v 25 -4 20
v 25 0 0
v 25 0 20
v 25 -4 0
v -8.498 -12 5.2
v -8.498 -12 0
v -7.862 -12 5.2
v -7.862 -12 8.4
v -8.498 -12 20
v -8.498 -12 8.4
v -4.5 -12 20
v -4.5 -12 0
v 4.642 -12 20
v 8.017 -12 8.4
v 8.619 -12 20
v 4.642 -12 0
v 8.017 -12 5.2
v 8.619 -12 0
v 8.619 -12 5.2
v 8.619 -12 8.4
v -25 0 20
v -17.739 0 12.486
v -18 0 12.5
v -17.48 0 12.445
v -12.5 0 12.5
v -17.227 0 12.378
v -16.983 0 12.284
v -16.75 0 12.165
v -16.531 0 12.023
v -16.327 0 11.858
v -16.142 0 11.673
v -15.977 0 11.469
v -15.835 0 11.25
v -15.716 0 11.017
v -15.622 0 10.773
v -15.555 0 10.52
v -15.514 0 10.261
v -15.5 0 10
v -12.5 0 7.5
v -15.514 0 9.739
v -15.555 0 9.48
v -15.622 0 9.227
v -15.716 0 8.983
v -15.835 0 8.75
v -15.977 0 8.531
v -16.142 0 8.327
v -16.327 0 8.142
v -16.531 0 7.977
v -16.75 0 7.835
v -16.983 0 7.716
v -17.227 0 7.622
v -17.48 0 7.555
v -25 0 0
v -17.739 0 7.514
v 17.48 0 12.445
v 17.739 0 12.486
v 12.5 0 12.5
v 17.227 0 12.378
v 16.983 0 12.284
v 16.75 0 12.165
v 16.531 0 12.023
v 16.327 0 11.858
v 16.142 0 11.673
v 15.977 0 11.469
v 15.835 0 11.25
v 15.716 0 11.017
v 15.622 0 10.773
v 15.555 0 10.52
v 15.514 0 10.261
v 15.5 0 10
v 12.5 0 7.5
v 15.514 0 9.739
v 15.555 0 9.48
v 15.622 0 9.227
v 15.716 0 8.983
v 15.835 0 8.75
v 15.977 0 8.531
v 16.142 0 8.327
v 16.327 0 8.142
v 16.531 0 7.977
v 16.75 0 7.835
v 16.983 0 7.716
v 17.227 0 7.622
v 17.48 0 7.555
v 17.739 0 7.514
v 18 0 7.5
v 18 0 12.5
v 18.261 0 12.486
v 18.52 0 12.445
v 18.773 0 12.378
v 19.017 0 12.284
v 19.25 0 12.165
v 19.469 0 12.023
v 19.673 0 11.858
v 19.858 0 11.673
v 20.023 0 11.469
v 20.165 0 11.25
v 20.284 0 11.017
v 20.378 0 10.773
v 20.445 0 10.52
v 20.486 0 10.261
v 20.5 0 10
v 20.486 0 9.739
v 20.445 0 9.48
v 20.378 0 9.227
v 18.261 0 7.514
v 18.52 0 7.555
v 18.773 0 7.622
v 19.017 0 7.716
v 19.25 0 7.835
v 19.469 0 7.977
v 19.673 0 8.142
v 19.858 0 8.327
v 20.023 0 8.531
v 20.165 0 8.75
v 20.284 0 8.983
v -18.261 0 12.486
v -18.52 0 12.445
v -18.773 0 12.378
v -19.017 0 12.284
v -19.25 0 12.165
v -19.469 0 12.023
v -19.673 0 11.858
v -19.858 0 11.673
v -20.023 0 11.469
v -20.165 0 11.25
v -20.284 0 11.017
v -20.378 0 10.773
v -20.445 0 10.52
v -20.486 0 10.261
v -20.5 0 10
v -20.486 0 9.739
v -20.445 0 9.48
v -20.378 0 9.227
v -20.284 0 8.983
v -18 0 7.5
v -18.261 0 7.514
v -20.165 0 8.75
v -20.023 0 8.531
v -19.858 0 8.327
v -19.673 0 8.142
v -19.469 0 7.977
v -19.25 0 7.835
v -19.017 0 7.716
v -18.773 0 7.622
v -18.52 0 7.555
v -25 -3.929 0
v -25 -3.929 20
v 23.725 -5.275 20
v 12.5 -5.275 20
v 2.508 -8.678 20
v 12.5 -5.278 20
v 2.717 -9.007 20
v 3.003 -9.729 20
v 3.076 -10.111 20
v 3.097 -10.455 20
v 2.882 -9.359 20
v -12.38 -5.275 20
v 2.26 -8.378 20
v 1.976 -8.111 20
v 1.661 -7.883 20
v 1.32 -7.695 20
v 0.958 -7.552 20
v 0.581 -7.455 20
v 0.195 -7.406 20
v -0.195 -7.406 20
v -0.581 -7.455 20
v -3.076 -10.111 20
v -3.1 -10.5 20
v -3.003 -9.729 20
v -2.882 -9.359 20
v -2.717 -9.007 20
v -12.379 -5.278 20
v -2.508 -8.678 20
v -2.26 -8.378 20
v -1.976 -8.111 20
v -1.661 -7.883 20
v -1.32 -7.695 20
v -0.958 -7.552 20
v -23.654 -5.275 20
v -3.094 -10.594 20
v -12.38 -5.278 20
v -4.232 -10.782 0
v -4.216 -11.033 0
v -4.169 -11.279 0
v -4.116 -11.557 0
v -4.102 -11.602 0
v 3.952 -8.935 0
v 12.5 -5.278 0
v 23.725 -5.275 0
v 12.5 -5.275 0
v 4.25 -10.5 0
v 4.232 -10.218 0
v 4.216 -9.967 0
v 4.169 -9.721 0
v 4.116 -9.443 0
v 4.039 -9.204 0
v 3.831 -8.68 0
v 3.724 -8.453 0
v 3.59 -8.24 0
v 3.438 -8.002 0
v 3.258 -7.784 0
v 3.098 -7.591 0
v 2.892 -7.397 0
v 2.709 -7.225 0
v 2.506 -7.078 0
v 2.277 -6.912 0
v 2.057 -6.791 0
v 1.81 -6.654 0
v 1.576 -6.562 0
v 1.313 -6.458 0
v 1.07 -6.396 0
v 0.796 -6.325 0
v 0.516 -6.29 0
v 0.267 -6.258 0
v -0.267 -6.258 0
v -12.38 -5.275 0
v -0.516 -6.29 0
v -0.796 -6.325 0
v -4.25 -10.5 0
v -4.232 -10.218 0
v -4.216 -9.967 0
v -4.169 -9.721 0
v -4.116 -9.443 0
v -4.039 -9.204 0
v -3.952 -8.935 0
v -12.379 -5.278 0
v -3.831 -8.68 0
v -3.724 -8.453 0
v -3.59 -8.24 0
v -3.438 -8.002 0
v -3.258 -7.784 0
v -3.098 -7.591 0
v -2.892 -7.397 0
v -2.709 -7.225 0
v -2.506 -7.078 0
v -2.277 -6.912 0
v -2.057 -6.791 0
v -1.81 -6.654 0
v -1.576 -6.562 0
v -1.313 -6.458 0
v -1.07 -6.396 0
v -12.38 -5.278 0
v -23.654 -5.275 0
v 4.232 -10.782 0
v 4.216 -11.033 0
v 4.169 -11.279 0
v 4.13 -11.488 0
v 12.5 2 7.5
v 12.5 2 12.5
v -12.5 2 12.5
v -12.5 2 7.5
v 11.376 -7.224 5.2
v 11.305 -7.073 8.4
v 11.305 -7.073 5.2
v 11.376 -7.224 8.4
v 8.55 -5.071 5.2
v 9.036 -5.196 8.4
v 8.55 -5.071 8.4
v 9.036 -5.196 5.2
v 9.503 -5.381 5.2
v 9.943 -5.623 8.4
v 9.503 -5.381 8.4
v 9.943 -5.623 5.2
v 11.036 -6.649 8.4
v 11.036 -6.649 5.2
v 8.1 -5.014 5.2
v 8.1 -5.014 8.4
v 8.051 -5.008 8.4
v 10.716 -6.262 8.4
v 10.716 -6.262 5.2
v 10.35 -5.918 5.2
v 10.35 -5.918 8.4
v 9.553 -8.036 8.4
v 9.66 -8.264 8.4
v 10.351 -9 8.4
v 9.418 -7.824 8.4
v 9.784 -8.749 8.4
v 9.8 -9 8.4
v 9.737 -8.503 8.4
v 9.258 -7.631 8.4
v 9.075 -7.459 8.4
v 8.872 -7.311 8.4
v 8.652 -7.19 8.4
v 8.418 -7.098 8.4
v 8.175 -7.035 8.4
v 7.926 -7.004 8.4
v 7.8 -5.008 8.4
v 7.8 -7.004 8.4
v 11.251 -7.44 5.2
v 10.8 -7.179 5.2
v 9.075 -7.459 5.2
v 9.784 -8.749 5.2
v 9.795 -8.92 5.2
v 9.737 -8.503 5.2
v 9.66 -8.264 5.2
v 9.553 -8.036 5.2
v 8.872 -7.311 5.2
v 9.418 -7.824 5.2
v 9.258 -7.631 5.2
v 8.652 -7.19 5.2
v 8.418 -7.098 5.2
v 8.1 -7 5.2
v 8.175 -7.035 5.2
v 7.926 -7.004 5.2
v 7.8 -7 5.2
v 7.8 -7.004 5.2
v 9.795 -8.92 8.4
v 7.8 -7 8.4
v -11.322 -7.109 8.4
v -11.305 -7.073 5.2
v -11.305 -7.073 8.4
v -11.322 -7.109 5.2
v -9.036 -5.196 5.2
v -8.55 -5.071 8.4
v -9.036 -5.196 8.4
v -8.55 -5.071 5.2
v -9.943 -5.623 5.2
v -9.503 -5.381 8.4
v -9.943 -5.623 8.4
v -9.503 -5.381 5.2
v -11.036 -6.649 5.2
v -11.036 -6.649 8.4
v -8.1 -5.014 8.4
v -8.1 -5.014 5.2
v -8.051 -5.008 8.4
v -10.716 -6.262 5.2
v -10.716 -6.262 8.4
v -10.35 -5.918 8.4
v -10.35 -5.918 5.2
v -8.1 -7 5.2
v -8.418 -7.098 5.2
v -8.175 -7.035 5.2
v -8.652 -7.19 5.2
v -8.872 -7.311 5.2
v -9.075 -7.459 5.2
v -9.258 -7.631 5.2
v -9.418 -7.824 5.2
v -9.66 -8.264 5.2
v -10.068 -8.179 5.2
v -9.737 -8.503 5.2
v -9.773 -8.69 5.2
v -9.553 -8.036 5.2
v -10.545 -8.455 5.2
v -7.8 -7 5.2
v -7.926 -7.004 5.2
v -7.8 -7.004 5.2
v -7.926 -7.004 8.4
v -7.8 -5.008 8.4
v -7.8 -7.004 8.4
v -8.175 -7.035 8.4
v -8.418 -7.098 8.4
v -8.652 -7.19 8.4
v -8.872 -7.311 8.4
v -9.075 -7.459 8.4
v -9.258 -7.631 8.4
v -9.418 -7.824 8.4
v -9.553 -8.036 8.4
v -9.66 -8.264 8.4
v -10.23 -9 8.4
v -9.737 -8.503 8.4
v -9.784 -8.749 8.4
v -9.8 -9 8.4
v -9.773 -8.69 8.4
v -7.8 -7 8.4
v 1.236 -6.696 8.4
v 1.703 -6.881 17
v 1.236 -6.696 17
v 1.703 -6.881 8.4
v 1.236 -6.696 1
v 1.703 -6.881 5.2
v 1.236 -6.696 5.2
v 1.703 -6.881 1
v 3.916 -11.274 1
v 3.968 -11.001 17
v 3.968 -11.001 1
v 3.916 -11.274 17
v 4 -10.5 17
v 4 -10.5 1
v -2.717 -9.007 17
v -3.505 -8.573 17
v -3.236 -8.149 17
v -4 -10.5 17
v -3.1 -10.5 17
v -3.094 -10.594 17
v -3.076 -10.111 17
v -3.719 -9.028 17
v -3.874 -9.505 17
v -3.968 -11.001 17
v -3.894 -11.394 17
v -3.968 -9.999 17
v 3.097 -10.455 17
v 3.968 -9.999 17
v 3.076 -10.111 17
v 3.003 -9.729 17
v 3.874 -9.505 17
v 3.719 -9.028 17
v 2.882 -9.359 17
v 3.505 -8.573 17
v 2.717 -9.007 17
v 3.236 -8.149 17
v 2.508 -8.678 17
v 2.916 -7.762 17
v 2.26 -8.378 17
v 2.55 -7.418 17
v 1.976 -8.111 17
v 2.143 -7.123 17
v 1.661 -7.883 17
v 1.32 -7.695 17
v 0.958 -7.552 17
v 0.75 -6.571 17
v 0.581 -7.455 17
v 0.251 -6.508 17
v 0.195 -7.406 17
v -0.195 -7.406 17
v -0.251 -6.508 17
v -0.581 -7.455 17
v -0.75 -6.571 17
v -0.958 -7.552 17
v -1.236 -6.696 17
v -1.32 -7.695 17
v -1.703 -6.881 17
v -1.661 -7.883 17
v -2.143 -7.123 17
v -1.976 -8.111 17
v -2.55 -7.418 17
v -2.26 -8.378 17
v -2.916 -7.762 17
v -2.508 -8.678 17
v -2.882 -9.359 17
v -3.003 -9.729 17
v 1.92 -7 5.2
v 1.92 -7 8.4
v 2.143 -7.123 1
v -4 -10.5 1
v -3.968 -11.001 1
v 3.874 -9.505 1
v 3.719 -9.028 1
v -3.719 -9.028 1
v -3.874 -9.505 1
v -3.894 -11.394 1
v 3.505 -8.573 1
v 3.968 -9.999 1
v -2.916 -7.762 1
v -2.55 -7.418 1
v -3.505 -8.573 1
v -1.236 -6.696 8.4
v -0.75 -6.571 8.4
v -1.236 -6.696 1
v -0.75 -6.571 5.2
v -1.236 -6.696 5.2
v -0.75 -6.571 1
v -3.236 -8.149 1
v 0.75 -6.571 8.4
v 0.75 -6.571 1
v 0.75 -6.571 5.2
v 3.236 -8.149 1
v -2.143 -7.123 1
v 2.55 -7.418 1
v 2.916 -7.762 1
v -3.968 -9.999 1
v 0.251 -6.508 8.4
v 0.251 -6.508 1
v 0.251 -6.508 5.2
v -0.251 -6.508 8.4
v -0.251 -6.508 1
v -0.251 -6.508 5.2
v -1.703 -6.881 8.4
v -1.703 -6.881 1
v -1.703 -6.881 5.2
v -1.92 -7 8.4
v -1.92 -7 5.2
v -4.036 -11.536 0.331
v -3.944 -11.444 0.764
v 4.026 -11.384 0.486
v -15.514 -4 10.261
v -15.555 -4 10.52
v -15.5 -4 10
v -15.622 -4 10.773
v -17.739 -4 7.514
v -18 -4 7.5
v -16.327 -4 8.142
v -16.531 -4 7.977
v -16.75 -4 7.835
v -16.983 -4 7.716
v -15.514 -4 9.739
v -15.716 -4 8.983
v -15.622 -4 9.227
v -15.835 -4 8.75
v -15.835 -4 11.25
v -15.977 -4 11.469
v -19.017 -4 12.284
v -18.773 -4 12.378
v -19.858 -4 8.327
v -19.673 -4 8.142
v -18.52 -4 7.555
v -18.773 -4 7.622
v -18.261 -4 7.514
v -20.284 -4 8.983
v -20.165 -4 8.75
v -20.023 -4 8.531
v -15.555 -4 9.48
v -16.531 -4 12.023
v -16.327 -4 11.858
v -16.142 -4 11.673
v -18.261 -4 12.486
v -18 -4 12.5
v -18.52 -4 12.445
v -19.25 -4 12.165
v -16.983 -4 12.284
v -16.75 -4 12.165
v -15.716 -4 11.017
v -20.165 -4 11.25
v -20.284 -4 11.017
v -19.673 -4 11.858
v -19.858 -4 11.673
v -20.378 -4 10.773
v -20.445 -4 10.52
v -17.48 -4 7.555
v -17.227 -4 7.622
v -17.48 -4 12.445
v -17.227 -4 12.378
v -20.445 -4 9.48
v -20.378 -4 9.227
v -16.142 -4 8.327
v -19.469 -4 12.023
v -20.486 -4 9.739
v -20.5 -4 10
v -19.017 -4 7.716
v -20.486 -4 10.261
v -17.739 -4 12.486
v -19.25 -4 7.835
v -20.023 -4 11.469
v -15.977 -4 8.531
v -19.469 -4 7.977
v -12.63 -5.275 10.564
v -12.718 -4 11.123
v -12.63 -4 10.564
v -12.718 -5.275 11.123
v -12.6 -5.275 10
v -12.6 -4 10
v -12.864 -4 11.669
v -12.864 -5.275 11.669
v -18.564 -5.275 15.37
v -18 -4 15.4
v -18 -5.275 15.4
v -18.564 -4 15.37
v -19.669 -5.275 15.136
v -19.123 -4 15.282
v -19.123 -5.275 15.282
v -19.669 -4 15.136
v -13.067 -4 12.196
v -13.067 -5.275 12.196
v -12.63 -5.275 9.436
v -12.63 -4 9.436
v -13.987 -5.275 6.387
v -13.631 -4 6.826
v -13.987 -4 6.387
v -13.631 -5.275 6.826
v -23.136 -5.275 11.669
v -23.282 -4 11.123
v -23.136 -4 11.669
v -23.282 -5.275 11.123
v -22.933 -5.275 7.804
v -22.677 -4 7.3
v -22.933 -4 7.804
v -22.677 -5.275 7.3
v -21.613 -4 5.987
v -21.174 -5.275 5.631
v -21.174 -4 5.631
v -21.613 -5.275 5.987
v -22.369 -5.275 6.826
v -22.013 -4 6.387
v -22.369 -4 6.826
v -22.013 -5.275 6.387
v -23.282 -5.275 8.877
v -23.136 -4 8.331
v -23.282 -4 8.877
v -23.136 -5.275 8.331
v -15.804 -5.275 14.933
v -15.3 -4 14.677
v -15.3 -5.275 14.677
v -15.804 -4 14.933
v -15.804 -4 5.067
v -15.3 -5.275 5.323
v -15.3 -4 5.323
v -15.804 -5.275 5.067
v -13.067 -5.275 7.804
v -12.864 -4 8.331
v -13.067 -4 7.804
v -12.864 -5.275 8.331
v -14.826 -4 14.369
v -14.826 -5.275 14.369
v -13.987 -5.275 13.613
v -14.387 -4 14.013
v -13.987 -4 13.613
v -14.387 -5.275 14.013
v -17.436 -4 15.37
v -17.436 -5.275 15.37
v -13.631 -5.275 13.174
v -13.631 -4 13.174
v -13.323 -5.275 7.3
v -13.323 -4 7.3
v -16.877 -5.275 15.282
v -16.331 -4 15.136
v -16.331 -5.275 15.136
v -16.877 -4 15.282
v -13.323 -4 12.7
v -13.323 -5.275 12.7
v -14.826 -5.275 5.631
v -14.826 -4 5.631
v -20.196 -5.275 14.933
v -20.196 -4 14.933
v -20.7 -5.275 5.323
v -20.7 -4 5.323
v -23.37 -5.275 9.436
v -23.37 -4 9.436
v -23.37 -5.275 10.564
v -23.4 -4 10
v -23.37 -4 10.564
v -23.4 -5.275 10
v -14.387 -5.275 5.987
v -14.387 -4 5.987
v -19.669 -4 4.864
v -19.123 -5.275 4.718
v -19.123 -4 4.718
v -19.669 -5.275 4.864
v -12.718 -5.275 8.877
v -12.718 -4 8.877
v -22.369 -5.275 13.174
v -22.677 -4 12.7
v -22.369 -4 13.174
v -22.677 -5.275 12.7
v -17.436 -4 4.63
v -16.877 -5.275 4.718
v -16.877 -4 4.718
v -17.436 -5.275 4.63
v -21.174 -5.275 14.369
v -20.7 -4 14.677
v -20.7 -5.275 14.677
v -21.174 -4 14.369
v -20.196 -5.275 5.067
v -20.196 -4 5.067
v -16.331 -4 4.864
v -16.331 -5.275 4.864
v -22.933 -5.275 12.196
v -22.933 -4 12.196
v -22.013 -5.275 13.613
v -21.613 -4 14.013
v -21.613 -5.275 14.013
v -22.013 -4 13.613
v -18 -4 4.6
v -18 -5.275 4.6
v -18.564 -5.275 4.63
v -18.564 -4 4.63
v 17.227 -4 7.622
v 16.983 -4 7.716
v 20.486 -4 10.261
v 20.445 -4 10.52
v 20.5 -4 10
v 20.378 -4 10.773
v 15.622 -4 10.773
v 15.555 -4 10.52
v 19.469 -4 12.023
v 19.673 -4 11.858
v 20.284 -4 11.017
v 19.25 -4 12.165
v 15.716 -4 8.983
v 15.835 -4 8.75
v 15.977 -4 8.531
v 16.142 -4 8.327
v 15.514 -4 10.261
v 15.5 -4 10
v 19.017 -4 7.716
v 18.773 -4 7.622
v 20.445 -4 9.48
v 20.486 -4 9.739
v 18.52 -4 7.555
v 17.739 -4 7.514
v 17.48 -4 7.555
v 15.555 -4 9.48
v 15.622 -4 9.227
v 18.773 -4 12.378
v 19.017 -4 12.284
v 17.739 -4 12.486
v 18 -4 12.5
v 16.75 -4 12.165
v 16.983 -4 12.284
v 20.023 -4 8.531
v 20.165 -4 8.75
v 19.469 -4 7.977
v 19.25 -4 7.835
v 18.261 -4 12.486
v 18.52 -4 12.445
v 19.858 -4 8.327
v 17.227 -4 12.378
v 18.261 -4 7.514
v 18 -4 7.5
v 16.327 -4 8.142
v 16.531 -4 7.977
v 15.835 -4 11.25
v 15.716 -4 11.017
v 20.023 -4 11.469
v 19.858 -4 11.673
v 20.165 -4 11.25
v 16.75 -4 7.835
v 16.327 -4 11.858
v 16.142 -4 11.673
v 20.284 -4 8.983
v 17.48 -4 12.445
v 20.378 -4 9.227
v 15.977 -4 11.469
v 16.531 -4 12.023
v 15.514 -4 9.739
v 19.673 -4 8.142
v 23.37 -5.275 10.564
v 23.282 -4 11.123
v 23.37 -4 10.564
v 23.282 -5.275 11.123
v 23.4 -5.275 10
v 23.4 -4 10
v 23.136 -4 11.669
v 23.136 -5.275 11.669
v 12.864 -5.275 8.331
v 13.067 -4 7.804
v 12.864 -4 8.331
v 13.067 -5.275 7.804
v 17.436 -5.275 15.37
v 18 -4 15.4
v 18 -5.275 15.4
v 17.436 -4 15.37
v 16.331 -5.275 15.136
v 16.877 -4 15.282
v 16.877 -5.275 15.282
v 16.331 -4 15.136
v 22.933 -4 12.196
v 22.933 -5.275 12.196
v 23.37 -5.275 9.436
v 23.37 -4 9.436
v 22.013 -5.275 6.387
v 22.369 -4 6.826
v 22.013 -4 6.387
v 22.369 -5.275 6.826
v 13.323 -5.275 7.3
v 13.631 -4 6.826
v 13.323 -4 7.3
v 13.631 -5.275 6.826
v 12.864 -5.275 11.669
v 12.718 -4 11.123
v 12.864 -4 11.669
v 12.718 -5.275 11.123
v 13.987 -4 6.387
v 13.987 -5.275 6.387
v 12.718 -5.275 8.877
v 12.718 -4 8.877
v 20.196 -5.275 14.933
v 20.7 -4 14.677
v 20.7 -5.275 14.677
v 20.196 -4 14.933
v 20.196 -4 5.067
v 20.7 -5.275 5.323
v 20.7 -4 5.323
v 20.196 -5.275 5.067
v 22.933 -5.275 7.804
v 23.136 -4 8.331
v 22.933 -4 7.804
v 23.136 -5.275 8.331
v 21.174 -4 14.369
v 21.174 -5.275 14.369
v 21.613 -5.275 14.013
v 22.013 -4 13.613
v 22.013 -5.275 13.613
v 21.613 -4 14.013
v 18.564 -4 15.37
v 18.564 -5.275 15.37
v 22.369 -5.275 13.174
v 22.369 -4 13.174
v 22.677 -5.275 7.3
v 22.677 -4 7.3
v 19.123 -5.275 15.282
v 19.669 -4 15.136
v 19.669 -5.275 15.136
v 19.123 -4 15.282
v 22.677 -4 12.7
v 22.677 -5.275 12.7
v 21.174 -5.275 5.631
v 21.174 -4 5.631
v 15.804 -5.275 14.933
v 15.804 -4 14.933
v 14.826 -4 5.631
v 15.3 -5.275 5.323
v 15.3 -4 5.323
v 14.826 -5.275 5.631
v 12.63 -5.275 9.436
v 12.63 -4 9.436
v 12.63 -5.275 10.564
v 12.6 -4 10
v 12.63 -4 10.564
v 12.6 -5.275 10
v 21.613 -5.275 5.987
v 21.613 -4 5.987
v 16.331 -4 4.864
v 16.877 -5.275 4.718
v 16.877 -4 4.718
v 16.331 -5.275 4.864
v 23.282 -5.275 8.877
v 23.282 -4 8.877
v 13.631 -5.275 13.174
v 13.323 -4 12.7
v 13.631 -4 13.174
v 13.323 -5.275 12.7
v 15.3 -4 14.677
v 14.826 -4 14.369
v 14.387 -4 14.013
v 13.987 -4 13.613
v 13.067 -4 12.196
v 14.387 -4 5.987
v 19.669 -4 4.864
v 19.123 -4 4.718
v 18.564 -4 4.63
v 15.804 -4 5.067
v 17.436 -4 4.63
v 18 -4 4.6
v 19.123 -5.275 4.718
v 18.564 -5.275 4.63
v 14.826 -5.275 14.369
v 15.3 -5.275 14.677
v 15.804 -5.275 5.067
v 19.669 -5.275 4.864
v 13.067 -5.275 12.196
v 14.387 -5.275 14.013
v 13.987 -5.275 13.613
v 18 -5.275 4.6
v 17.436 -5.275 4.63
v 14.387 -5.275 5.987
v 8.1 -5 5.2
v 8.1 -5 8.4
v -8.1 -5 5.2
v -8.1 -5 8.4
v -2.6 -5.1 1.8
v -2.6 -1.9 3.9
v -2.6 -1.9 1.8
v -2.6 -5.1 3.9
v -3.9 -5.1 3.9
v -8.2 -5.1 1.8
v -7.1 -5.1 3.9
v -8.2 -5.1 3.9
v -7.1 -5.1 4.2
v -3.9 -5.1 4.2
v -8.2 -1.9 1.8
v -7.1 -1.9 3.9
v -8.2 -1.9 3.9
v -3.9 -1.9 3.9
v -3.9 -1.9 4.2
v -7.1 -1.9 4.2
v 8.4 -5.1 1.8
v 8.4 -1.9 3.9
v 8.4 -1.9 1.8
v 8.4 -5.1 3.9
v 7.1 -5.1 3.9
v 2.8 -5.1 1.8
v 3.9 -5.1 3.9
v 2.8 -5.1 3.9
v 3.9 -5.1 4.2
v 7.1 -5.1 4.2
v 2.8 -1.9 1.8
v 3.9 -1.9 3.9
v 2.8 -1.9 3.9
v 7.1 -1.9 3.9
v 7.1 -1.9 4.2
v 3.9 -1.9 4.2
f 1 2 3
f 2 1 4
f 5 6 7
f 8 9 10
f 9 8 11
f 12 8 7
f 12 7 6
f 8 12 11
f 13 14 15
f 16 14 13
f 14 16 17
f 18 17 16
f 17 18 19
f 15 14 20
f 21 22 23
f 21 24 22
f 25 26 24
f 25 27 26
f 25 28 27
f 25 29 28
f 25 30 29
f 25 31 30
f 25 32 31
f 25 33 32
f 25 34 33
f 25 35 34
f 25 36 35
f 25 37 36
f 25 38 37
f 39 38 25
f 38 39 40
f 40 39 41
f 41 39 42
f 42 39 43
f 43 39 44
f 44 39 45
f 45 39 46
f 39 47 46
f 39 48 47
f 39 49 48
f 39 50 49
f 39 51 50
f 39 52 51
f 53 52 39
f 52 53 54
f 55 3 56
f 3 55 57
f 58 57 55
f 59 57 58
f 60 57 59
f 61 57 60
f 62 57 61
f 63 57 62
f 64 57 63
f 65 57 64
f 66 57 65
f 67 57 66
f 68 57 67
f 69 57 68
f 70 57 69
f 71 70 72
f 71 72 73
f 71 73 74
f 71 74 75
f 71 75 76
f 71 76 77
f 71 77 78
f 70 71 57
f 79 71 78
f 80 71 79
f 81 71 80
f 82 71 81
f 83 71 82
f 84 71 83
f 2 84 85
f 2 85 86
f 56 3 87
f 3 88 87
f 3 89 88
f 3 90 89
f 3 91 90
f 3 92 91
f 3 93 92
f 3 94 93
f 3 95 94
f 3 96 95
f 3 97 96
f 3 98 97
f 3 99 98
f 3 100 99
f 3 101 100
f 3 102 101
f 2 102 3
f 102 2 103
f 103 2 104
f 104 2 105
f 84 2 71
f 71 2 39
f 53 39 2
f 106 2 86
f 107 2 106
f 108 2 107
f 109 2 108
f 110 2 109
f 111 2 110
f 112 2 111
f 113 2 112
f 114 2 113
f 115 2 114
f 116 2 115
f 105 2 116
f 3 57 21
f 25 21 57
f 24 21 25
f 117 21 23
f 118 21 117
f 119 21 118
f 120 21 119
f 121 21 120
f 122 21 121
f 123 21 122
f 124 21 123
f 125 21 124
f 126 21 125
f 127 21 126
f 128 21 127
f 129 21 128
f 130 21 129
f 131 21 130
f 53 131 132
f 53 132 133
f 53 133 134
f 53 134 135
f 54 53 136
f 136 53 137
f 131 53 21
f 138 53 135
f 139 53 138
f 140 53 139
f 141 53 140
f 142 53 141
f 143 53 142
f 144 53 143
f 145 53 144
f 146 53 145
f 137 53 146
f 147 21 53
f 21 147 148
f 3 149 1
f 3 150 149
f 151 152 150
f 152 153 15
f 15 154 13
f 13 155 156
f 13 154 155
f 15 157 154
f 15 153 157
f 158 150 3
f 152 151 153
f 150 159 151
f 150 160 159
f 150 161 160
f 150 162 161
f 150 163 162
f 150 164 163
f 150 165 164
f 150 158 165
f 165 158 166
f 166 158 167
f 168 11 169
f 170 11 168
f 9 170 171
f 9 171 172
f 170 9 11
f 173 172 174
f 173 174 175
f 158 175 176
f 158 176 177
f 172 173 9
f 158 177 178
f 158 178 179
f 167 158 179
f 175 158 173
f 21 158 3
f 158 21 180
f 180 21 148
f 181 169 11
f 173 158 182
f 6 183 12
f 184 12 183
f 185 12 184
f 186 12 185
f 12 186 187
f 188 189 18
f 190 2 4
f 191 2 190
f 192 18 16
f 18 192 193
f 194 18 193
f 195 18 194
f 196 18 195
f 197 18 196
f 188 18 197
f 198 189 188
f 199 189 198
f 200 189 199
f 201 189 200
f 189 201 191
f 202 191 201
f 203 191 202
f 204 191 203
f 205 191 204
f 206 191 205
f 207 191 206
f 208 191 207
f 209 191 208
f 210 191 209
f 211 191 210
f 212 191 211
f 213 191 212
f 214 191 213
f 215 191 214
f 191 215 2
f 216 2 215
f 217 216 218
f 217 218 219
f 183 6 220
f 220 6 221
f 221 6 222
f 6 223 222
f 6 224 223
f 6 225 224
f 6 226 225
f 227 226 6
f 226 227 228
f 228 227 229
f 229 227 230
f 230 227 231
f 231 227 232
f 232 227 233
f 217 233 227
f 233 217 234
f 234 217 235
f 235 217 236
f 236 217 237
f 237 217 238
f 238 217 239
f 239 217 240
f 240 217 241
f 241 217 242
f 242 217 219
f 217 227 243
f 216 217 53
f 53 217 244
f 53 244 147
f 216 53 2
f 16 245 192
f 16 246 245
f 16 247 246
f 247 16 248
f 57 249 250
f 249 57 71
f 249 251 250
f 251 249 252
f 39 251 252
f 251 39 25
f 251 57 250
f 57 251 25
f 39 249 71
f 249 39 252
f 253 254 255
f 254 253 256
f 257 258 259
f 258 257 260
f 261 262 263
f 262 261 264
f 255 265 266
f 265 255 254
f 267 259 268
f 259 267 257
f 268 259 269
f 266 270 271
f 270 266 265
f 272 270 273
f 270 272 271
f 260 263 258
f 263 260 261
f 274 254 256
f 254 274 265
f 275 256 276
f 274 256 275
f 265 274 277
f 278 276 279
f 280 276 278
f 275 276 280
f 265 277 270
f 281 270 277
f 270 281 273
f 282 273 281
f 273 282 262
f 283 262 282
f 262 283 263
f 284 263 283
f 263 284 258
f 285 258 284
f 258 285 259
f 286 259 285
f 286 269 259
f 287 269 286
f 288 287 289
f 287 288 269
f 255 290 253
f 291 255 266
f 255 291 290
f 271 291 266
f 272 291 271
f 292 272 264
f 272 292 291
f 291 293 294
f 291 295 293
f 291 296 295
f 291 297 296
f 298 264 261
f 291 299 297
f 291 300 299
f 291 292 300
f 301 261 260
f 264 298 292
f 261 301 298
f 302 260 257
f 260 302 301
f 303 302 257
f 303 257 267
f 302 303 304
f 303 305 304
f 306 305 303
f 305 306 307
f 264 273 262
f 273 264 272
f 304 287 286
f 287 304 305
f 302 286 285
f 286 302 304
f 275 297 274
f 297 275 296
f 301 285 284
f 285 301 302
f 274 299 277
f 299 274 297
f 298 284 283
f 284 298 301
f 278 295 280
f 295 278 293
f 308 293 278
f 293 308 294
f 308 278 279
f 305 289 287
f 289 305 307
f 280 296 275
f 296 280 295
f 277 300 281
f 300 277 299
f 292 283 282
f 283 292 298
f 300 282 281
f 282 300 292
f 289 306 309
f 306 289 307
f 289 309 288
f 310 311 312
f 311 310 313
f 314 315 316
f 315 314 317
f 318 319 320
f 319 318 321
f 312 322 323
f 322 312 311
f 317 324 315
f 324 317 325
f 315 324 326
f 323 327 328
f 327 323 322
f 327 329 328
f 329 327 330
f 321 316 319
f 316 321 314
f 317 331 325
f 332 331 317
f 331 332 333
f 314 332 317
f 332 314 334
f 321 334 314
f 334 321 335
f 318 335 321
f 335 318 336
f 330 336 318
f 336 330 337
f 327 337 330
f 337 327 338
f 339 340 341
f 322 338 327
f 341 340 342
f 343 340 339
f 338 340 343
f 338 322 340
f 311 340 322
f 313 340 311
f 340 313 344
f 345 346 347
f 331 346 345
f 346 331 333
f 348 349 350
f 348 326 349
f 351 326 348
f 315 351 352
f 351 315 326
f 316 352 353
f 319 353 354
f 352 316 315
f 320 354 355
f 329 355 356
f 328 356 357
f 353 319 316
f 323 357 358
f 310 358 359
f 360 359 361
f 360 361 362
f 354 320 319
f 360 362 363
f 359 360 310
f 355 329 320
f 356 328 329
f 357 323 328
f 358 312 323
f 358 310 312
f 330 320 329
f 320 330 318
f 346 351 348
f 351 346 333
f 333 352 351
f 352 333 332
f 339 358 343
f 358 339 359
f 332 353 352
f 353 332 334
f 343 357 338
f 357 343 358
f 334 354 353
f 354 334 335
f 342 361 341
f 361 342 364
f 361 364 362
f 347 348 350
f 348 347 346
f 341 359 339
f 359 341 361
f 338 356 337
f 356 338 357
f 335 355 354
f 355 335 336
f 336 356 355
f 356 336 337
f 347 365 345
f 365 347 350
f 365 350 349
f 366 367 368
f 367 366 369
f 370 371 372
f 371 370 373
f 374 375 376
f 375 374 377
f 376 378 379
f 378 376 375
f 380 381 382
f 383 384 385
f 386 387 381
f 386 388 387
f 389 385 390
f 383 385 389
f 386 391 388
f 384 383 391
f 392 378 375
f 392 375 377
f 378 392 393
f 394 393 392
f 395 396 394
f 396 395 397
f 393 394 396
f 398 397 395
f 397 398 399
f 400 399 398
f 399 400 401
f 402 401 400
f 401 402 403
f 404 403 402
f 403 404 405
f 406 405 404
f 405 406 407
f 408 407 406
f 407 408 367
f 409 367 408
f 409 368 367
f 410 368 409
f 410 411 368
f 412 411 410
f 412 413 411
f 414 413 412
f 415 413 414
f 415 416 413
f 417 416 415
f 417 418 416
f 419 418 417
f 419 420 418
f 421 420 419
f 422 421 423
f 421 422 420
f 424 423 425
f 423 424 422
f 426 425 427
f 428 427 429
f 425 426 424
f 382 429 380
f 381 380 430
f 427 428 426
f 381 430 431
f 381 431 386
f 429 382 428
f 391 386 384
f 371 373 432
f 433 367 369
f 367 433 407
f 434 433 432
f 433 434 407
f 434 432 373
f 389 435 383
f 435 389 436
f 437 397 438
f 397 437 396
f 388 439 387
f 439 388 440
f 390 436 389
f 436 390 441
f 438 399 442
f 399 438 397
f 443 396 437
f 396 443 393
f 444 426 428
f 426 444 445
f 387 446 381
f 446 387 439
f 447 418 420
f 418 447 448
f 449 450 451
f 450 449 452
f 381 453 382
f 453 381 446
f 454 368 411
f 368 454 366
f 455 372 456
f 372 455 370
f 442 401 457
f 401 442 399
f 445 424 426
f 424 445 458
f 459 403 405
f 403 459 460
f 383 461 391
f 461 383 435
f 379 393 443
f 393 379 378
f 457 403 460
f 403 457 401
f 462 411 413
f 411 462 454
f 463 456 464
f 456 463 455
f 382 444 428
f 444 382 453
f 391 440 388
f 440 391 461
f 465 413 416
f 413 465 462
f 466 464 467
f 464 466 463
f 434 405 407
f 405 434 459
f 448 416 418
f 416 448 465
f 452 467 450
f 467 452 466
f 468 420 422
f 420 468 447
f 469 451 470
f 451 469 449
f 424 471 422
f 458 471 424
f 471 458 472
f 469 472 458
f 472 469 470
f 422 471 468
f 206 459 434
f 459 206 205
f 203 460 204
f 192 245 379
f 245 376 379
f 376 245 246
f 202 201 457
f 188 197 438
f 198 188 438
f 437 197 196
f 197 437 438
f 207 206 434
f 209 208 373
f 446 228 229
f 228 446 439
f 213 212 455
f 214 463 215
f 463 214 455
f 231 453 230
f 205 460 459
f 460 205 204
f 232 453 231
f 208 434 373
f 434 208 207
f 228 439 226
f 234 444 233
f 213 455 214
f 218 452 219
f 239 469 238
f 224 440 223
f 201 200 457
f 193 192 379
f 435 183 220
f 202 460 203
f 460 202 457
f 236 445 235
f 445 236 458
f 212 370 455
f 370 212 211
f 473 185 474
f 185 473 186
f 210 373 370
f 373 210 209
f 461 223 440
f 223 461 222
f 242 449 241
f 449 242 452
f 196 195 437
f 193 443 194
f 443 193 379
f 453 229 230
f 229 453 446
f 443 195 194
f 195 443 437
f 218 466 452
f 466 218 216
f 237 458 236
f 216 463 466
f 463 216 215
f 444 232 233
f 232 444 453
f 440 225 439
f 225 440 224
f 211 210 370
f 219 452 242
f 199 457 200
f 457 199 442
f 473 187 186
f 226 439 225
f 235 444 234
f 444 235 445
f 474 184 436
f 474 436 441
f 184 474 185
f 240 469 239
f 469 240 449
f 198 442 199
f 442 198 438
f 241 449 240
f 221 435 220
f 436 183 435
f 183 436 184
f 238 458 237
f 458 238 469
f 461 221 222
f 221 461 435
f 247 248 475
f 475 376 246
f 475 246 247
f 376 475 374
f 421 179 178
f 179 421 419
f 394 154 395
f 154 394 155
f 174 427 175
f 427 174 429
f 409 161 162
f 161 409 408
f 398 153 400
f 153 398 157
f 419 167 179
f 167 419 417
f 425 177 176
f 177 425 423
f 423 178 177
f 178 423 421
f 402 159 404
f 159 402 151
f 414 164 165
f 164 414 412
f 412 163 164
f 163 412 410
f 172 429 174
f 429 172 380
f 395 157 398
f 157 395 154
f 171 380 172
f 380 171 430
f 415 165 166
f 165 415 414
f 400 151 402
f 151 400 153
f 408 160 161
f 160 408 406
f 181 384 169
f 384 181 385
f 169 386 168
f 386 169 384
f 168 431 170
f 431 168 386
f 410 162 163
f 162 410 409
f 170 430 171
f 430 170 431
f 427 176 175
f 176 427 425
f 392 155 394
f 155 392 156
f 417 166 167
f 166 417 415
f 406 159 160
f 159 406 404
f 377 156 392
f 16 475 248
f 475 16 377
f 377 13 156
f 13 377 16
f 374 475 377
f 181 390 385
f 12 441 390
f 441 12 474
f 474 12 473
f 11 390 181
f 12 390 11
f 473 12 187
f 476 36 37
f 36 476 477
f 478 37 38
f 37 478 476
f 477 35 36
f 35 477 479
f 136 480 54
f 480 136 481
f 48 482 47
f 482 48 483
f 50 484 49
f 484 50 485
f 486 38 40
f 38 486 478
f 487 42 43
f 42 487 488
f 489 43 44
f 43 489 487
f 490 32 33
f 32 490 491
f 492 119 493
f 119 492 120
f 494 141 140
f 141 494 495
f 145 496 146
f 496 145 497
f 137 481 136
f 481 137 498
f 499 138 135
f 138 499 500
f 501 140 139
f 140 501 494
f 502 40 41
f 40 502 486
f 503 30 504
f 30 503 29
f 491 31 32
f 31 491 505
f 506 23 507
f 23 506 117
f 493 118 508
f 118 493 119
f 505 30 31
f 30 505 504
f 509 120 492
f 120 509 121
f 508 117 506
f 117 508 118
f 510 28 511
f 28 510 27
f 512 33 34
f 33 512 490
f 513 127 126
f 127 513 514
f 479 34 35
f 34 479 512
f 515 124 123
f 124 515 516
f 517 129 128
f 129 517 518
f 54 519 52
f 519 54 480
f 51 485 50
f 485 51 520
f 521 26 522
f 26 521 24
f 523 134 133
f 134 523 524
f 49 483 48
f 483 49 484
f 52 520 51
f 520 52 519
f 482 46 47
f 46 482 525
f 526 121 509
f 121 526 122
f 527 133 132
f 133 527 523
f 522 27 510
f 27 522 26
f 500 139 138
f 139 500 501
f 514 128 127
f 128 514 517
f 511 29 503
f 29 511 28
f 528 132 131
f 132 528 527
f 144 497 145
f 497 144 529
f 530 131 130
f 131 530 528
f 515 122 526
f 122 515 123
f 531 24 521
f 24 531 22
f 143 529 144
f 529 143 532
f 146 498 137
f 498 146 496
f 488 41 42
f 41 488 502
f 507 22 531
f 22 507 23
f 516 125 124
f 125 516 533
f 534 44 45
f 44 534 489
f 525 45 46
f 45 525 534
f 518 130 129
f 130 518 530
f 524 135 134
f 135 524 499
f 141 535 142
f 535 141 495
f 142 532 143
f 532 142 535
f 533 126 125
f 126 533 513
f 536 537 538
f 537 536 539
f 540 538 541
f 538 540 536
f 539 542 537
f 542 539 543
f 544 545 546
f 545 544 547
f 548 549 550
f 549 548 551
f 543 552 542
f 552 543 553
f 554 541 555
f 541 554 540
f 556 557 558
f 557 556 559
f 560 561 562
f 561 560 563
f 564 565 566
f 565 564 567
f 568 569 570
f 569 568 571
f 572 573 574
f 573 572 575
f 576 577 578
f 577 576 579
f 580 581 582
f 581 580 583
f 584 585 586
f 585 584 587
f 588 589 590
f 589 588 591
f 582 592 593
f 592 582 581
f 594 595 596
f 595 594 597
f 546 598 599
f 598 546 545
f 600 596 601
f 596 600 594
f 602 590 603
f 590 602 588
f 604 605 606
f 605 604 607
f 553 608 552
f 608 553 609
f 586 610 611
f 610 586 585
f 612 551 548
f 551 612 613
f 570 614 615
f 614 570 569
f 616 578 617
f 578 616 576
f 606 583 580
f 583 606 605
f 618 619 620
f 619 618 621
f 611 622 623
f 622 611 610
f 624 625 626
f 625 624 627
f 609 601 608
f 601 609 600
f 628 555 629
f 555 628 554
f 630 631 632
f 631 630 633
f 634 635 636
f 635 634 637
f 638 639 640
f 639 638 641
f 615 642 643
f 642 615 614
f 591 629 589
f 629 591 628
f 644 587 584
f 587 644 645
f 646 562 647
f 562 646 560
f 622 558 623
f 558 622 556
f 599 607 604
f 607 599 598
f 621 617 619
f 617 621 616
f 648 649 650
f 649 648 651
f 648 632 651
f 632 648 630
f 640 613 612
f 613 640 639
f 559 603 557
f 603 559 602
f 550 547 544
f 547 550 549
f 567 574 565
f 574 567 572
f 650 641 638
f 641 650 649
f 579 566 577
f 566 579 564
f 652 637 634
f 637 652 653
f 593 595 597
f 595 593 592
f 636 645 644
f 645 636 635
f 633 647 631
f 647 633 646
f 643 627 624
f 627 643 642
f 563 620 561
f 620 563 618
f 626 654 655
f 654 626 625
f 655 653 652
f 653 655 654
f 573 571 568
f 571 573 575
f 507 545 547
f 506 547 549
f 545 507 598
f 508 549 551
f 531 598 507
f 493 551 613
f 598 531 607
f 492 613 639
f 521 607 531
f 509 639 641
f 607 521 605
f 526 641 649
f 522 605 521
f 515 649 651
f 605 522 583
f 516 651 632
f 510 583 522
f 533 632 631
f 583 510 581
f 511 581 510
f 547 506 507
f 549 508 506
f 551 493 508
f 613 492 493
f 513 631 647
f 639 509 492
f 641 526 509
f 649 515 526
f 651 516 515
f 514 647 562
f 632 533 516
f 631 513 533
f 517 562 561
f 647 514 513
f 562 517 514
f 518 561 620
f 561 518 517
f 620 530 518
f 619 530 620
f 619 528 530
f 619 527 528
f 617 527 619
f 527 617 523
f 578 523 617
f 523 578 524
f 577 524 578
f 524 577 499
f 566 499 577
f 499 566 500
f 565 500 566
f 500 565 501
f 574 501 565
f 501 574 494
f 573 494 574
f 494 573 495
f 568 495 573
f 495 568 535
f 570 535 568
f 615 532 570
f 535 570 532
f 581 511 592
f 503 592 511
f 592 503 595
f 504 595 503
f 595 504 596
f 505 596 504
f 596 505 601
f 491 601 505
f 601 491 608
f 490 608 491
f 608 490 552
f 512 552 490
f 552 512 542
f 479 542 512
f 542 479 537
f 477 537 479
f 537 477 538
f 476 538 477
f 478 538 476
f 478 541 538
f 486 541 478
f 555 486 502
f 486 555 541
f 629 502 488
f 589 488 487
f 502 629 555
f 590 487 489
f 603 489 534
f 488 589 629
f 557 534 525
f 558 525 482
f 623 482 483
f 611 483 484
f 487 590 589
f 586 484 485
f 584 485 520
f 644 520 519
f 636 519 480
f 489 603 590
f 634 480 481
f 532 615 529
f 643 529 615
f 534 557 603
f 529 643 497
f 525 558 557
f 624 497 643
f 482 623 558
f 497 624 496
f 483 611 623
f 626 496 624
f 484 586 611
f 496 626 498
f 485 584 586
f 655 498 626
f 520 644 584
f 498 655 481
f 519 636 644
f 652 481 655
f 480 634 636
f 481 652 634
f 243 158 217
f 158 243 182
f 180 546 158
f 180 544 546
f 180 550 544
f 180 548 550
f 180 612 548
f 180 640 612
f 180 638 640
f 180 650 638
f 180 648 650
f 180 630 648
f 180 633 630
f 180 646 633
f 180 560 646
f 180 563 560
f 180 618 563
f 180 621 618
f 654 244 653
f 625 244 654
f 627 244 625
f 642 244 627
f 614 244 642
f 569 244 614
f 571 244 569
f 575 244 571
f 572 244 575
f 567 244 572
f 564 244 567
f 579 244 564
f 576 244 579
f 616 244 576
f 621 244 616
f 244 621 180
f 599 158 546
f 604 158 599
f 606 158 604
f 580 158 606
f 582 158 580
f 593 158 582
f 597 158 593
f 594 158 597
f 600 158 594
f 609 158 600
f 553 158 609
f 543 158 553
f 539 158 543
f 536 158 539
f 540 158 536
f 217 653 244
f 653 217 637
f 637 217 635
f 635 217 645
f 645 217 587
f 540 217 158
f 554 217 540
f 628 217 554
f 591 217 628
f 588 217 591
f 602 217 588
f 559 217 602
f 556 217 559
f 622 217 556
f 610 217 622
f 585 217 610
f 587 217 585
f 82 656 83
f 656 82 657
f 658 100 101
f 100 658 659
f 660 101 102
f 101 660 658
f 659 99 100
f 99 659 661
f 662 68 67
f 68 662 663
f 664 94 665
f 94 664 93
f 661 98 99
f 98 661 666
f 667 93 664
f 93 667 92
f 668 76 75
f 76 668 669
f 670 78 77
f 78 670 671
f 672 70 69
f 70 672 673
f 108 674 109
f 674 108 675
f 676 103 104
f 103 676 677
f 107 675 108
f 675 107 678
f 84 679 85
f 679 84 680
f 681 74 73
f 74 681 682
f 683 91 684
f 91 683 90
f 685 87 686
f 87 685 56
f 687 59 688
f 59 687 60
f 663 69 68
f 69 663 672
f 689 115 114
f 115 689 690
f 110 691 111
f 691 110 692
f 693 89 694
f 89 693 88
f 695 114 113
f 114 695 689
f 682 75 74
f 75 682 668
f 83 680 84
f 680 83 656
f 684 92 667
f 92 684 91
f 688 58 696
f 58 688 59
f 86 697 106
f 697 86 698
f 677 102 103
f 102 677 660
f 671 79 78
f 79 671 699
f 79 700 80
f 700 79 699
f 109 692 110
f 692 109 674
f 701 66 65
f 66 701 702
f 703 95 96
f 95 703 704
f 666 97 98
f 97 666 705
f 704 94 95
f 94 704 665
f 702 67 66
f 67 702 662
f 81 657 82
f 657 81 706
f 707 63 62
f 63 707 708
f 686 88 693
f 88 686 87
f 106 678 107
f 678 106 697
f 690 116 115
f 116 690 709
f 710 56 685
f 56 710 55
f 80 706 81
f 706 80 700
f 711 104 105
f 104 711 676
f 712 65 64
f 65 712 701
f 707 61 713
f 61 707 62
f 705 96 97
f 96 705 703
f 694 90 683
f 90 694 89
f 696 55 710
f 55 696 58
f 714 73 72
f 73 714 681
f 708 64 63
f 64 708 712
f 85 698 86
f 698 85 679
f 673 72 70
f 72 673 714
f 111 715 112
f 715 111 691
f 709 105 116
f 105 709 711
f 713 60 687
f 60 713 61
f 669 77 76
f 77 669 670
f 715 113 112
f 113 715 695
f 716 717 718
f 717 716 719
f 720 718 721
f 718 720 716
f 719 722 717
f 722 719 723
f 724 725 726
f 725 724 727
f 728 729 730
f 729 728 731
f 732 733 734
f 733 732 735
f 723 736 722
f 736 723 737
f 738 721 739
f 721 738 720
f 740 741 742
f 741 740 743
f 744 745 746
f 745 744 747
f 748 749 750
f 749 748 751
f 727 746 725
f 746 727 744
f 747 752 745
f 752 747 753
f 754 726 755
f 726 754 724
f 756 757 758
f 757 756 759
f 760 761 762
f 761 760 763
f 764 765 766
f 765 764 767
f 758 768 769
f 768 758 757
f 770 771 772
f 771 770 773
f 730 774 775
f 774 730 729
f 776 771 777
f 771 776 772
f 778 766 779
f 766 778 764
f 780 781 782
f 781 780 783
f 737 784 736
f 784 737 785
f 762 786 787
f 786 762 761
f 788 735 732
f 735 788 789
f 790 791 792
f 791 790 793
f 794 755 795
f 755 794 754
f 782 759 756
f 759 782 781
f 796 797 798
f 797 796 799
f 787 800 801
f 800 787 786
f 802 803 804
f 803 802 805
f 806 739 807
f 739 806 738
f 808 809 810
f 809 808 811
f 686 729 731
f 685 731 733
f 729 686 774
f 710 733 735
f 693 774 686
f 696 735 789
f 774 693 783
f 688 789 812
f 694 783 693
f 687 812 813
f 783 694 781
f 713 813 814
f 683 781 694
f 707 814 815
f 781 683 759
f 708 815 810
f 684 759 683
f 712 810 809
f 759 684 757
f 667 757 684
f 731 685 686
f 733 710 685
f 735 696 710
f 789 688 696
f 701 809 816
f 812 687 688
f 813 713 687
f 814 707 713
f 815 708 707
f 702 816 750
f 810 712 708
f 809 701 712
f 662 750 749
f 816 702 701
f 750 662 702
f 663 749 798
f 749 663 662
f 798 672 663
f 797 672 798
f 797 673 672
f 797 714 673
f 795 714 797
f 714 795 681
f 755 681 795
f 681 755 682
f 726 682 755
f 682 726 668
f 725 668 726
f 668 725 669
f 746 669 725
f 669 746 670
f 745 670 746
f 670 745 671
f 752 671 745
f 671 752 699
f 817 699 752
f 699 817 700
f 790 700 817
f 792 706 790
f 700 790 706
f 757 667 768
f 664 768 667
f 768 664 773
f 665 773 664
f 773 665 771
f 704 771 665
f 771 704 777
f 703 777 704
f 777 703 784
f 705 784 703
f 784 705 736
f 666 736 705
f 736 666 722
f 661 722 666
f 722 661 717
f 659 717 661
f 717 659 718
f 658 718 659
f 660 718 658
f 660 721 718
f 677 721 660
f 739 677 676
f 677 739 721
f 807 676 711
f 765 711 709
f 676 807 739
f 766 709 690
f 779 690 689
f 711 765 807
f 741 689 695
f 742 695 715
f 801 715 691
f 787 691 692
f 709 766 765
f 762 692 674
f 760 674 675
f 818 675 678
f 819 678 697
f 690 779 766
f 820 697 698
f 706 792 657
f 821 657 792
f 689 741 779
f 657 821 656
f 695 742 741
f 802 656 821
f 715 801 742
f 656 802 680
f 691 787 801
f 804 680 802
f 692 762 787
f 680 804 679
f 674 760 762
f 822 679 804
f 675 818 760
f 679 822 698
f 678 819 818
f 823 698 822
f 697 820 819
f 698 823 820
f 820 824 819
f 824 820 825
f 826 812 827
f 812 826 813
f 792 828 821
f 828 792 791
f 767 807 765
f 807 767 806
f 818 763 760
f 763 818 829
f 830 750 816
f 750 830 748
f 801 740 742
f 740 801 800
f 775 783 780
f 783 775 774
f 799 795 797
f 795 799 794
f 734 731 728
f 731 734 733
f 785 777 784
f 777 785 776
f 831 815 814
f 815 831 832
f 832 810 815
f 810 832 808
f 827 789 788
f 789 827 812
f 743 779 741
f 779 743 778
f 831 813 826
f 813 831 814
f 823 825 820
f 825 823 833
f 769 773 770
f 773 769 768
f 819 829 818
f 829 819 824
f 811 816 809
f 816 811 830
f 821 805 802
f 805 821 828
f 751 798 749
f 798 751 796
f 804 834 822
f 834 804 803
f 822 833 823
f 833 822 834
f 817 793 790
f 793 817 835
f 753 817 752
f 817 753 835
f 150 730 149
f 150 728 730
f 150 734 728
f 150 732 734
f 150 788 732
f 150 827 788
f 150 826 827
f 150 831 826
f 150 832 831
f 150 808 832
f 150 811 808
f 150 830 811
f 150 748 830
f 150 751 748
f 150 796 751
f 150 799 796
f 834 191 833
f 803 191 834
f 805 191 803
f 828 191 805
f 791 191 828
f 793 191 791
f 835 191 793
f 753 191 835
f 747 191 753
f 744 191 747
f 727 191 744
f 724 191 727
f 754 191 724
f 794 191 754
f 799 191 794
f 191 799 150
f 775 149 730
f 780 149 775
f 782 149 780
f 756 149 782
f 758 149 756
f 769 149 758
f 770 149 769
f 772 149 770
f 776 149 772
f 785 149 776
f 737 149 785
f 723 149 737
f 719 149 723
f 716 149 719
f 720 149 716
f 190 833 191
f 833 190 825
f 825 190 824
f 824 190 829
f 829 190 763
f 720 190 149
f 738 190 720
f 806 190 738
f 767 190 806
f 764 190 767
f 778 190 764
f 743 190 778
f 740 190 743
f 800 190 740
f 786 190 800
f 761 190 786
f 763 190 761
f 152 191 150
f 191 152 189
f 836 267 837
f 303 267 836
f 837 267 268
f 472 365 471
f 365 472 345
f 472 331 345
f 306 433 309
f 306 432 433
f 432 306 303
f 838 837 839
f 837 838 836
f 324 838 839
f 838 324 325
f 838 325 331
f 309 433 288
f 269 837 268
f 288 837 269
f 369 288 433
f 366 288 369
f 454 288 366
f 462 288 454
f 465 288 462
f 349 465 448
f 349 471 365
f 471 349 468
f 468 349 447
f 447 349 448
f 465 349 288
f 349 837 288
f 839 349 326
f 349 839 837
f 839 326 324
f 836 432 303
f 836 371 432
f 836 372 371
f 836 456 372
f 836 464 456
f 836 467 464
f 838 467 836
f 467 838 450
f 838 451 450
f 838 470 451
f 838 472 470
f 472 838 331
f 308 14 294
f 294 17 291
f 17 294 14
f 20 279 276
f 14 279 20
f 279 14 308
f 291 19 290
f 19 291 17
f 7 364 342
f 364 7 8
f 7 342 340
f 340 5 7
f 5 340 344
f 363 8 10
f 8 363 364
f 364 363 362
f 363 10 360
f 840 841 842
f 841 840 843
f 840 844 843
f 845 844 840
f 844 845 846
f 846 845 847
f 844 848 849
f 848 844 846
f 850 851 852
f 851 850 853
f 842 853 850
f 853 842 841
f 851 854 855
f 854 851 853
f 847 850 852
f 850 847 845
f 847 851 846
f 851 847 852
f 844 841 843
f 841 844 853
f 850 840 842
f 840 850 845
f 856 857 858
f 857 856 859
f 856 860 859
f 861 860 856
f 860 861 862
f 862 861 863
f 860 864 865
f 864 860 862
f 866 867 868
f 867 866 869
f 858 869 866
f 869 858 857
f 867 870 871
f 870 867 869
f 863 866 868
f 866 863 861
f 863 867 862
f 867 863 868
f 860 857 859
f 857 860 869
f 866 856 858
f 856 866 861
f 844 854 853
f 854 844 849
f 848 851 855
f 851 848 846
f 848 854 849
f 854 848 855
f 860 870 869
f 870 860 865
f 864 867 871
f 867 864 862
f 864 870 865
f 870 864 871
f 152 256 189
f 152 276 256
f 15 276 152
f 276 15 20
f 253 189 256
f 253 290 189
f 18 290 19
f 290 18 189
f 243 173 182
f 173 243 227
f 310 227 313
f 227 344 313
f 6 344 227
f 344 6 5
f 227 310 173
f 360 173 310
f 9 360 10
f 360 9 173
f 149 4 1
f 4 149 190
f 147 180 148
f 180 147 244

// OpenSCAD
// PRUSA iteration4
// Y holder front
// GNU GPL v3
// Josef Průša <iam@josefprusa.cz> and contributors
// http://www.reprap.org/wiki/Prusa_Mendel
// http://prusamendel.org

module ziptie_round_edge()
{
    difference()
    {
        translate([0,0,0]) rotate([90,0,0]) cylinder( h=3.2, r=4, $fn=50 );  
        translate([0,1,0]) rotate([90,0,0]) cylinder( h=5, r=2, $fn=50 );  
        translate([-10,-4,0]) cube([20,5,5]);
        translate([-20,-4,-13]) cube([20,5,20]);
    }
}


module part()    
{

    difference()
    {
        union()
        {
            // body block
            translate([-25,0,0]) cube([50,20,12]); 
            translate([-12.5,7.5,-2]) cube([25,5,2]);
        }

        // y-axis cut
        translate([0,17,10.5]) rotate([90,0,0]) cylinder( h=21, r=4, $fn=50 );        
        translate([0,1,10.5]) rotate([90,0,0]) cylinder( h=2, r1=4, r2=4.5, $fn=50 );
        translate([0,21,10.5]) rotate([90,0,0]) cylinder( h=21, r=3.1, $fn=50 );
        translate([-7,-1,14.5]) rotate([0,45,0]) cube([10,22,10]);

        // screw holes
          translate([-18,10,-6]) cylinder( h=21, r=2.5, $fn=60 );
        translate([-18,10,4]) cylinder( h=21, r=5.4, $fn=60 );
          translate([-25.38,-1,5.275]) cube([13,22,10]);
          translate([18,10,-6]) cylinder( h=20, r=2.5, $fn=60 );
        translate([18,10,4]) cylinder( h=21, r=5.4, $fn=60 );
          translate([12.5,-1,5.275]) cube([13,22,10]);

        // ziptie
        translate([7.8,8.4,9]) ziptie_round_edge();
        translate([-7.8,5.2,9]) rotate([0,0,180]) ziptie_round_edge();
        translate([-8.1,5.2,5]) cube([16.2,3.2,2]);
        translate([0.8,5.2,24.5]) rotate([0,60,0]) cube([20,3.2,2]);
        translate([-1.8,5.2,26.5]) rotate([0,120,0]) cube([20,3.2,2]);
        
        // nut print supports
        translate([-8.2,1.8,3.5-3.2/2]) cube([5.6,2.1,3.2]);
        translate([2.8,1.8,3.5-3.2/2]) cube([5.6,2.1,3.2]);
        translate([-7.1,2.1,3.5-3.2/2]) cube([3.2,2.1,3.2]);
        translate([3.9,2.1,3.5-3.2/2]) cube([3.2,2.1,3.2]);

        // upper corners
        translate([4,-1,20]) rotate([0,60,0]) cube([17,30,20]);
        translate([-21.2,-1,30]) rotate([0,120,0]) cube([17,30,20]);
        
        //custom churuata3d
        translate([22,-1,7]) rotate([0,45,0]) cube([5,22,5]);
        translate([-29,-1,7]) rotate([0,45,0]) cube([5,22,5]);
        
    }
}


rotate([90,0,0])part();
